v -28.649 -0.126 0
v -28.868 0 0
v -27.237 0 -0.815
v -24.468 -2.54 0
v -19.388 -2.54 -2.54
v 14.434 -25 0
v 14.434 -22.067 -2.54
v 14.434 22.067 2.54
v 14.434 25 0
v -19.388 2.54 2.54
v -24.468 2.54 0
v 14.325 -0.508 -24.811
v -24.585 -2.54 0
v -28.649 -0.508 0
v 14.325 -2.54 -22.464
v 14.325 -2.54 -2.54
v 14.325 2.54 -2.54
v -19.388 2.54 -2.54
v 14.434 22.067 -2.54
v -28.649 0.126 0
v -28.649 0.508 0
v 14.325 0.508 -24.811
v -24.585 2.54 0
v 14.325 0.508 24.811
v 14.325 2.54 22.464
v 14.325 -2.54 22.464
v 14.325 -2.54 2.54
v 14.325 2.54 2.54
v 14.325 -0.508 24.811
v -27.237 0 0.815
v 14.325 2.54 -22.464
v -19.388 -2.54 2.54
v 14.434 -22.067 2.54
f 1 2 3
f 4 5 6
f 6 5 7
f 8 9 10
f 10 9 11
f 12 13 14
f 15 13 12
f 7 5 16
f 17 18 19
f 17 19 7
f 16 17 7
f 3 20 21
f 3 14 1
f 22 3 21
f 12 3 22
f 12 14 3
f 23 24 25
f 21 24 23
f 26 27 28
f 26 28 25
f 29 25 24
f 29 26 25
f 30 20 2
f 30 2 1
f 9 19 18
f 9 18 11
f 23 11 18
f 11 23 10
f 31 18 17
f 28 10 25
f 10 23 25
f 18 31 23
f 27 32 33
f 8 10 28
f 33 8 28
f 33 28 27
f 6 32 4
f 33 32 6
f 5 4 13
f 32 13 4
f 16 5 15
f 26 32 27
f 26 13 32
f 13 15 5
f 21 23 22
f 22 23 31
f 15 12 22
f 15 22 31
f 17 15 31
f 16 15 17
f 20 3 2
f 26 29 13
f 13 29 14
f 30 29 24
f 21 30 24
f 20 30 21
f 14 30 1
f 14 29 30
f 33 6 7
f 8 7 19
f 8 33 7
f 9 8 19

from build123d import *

# Parameters (mm, degrees)
F1_DEPTH = 2.54
F2_SIZE  = 2.53999
F4_DEPTH = 2.54
F5_SIZE  = 2.032


# Not quite as in the source:
# - a fillet or chamfer is up to 0.001 mm smaller than in the source, because OpenCascade refuses the exact size


with BuildPart() as f1:
    # F0 (on Top) → F1 (new body, symmetric)
    with BuildSketch(Plane.XY):
        Polygon((14.4337567297, -25), (14.4337567297, 25), (-28.8675134595, 0), align=None)
    extrude(amount=F1_DEPTH, both=True)

    # F2 (size 2.54 in the source; OpenCascade refuses exactly that, so slightly less here)
    f2_edges = [f1.edges().sort_by_distance(p)[0] for p in [
        (-7.216878, 12.5, 2.54),
        (-7.216878, -12.5, 2.54),
        (-7.216878, -12.5, -2.54),
        (-7.216878, 12.5, -2.54),
    ]]
    chamfer(f2_edges, length=F2_SIZE)

    # F3 (on Front) → F4 (join, symmetric)
    with BuildSketch(Plane.XZ):
        Polygon((14.3245235085, -24.810802511), (14.3245235085, 24.810802511), (-28.6490470171, 0), align=None)
    extrude(amount=F4_DEPTH, both=True)

    # F5
    f5_edges = [f1.edges().sort_by_distance(p)[0] for p in [
        (-7.162262, 2.54, 12.405401),
        (-7.162262, -2.54, 12.405401),
        (-7.162262, -2.54, -12.405401),
        (-7.162262, 2.54, -12.405401),
    ]]
    chamfer(f5_edges, length=F5_SIZE)


solid = f1.part
